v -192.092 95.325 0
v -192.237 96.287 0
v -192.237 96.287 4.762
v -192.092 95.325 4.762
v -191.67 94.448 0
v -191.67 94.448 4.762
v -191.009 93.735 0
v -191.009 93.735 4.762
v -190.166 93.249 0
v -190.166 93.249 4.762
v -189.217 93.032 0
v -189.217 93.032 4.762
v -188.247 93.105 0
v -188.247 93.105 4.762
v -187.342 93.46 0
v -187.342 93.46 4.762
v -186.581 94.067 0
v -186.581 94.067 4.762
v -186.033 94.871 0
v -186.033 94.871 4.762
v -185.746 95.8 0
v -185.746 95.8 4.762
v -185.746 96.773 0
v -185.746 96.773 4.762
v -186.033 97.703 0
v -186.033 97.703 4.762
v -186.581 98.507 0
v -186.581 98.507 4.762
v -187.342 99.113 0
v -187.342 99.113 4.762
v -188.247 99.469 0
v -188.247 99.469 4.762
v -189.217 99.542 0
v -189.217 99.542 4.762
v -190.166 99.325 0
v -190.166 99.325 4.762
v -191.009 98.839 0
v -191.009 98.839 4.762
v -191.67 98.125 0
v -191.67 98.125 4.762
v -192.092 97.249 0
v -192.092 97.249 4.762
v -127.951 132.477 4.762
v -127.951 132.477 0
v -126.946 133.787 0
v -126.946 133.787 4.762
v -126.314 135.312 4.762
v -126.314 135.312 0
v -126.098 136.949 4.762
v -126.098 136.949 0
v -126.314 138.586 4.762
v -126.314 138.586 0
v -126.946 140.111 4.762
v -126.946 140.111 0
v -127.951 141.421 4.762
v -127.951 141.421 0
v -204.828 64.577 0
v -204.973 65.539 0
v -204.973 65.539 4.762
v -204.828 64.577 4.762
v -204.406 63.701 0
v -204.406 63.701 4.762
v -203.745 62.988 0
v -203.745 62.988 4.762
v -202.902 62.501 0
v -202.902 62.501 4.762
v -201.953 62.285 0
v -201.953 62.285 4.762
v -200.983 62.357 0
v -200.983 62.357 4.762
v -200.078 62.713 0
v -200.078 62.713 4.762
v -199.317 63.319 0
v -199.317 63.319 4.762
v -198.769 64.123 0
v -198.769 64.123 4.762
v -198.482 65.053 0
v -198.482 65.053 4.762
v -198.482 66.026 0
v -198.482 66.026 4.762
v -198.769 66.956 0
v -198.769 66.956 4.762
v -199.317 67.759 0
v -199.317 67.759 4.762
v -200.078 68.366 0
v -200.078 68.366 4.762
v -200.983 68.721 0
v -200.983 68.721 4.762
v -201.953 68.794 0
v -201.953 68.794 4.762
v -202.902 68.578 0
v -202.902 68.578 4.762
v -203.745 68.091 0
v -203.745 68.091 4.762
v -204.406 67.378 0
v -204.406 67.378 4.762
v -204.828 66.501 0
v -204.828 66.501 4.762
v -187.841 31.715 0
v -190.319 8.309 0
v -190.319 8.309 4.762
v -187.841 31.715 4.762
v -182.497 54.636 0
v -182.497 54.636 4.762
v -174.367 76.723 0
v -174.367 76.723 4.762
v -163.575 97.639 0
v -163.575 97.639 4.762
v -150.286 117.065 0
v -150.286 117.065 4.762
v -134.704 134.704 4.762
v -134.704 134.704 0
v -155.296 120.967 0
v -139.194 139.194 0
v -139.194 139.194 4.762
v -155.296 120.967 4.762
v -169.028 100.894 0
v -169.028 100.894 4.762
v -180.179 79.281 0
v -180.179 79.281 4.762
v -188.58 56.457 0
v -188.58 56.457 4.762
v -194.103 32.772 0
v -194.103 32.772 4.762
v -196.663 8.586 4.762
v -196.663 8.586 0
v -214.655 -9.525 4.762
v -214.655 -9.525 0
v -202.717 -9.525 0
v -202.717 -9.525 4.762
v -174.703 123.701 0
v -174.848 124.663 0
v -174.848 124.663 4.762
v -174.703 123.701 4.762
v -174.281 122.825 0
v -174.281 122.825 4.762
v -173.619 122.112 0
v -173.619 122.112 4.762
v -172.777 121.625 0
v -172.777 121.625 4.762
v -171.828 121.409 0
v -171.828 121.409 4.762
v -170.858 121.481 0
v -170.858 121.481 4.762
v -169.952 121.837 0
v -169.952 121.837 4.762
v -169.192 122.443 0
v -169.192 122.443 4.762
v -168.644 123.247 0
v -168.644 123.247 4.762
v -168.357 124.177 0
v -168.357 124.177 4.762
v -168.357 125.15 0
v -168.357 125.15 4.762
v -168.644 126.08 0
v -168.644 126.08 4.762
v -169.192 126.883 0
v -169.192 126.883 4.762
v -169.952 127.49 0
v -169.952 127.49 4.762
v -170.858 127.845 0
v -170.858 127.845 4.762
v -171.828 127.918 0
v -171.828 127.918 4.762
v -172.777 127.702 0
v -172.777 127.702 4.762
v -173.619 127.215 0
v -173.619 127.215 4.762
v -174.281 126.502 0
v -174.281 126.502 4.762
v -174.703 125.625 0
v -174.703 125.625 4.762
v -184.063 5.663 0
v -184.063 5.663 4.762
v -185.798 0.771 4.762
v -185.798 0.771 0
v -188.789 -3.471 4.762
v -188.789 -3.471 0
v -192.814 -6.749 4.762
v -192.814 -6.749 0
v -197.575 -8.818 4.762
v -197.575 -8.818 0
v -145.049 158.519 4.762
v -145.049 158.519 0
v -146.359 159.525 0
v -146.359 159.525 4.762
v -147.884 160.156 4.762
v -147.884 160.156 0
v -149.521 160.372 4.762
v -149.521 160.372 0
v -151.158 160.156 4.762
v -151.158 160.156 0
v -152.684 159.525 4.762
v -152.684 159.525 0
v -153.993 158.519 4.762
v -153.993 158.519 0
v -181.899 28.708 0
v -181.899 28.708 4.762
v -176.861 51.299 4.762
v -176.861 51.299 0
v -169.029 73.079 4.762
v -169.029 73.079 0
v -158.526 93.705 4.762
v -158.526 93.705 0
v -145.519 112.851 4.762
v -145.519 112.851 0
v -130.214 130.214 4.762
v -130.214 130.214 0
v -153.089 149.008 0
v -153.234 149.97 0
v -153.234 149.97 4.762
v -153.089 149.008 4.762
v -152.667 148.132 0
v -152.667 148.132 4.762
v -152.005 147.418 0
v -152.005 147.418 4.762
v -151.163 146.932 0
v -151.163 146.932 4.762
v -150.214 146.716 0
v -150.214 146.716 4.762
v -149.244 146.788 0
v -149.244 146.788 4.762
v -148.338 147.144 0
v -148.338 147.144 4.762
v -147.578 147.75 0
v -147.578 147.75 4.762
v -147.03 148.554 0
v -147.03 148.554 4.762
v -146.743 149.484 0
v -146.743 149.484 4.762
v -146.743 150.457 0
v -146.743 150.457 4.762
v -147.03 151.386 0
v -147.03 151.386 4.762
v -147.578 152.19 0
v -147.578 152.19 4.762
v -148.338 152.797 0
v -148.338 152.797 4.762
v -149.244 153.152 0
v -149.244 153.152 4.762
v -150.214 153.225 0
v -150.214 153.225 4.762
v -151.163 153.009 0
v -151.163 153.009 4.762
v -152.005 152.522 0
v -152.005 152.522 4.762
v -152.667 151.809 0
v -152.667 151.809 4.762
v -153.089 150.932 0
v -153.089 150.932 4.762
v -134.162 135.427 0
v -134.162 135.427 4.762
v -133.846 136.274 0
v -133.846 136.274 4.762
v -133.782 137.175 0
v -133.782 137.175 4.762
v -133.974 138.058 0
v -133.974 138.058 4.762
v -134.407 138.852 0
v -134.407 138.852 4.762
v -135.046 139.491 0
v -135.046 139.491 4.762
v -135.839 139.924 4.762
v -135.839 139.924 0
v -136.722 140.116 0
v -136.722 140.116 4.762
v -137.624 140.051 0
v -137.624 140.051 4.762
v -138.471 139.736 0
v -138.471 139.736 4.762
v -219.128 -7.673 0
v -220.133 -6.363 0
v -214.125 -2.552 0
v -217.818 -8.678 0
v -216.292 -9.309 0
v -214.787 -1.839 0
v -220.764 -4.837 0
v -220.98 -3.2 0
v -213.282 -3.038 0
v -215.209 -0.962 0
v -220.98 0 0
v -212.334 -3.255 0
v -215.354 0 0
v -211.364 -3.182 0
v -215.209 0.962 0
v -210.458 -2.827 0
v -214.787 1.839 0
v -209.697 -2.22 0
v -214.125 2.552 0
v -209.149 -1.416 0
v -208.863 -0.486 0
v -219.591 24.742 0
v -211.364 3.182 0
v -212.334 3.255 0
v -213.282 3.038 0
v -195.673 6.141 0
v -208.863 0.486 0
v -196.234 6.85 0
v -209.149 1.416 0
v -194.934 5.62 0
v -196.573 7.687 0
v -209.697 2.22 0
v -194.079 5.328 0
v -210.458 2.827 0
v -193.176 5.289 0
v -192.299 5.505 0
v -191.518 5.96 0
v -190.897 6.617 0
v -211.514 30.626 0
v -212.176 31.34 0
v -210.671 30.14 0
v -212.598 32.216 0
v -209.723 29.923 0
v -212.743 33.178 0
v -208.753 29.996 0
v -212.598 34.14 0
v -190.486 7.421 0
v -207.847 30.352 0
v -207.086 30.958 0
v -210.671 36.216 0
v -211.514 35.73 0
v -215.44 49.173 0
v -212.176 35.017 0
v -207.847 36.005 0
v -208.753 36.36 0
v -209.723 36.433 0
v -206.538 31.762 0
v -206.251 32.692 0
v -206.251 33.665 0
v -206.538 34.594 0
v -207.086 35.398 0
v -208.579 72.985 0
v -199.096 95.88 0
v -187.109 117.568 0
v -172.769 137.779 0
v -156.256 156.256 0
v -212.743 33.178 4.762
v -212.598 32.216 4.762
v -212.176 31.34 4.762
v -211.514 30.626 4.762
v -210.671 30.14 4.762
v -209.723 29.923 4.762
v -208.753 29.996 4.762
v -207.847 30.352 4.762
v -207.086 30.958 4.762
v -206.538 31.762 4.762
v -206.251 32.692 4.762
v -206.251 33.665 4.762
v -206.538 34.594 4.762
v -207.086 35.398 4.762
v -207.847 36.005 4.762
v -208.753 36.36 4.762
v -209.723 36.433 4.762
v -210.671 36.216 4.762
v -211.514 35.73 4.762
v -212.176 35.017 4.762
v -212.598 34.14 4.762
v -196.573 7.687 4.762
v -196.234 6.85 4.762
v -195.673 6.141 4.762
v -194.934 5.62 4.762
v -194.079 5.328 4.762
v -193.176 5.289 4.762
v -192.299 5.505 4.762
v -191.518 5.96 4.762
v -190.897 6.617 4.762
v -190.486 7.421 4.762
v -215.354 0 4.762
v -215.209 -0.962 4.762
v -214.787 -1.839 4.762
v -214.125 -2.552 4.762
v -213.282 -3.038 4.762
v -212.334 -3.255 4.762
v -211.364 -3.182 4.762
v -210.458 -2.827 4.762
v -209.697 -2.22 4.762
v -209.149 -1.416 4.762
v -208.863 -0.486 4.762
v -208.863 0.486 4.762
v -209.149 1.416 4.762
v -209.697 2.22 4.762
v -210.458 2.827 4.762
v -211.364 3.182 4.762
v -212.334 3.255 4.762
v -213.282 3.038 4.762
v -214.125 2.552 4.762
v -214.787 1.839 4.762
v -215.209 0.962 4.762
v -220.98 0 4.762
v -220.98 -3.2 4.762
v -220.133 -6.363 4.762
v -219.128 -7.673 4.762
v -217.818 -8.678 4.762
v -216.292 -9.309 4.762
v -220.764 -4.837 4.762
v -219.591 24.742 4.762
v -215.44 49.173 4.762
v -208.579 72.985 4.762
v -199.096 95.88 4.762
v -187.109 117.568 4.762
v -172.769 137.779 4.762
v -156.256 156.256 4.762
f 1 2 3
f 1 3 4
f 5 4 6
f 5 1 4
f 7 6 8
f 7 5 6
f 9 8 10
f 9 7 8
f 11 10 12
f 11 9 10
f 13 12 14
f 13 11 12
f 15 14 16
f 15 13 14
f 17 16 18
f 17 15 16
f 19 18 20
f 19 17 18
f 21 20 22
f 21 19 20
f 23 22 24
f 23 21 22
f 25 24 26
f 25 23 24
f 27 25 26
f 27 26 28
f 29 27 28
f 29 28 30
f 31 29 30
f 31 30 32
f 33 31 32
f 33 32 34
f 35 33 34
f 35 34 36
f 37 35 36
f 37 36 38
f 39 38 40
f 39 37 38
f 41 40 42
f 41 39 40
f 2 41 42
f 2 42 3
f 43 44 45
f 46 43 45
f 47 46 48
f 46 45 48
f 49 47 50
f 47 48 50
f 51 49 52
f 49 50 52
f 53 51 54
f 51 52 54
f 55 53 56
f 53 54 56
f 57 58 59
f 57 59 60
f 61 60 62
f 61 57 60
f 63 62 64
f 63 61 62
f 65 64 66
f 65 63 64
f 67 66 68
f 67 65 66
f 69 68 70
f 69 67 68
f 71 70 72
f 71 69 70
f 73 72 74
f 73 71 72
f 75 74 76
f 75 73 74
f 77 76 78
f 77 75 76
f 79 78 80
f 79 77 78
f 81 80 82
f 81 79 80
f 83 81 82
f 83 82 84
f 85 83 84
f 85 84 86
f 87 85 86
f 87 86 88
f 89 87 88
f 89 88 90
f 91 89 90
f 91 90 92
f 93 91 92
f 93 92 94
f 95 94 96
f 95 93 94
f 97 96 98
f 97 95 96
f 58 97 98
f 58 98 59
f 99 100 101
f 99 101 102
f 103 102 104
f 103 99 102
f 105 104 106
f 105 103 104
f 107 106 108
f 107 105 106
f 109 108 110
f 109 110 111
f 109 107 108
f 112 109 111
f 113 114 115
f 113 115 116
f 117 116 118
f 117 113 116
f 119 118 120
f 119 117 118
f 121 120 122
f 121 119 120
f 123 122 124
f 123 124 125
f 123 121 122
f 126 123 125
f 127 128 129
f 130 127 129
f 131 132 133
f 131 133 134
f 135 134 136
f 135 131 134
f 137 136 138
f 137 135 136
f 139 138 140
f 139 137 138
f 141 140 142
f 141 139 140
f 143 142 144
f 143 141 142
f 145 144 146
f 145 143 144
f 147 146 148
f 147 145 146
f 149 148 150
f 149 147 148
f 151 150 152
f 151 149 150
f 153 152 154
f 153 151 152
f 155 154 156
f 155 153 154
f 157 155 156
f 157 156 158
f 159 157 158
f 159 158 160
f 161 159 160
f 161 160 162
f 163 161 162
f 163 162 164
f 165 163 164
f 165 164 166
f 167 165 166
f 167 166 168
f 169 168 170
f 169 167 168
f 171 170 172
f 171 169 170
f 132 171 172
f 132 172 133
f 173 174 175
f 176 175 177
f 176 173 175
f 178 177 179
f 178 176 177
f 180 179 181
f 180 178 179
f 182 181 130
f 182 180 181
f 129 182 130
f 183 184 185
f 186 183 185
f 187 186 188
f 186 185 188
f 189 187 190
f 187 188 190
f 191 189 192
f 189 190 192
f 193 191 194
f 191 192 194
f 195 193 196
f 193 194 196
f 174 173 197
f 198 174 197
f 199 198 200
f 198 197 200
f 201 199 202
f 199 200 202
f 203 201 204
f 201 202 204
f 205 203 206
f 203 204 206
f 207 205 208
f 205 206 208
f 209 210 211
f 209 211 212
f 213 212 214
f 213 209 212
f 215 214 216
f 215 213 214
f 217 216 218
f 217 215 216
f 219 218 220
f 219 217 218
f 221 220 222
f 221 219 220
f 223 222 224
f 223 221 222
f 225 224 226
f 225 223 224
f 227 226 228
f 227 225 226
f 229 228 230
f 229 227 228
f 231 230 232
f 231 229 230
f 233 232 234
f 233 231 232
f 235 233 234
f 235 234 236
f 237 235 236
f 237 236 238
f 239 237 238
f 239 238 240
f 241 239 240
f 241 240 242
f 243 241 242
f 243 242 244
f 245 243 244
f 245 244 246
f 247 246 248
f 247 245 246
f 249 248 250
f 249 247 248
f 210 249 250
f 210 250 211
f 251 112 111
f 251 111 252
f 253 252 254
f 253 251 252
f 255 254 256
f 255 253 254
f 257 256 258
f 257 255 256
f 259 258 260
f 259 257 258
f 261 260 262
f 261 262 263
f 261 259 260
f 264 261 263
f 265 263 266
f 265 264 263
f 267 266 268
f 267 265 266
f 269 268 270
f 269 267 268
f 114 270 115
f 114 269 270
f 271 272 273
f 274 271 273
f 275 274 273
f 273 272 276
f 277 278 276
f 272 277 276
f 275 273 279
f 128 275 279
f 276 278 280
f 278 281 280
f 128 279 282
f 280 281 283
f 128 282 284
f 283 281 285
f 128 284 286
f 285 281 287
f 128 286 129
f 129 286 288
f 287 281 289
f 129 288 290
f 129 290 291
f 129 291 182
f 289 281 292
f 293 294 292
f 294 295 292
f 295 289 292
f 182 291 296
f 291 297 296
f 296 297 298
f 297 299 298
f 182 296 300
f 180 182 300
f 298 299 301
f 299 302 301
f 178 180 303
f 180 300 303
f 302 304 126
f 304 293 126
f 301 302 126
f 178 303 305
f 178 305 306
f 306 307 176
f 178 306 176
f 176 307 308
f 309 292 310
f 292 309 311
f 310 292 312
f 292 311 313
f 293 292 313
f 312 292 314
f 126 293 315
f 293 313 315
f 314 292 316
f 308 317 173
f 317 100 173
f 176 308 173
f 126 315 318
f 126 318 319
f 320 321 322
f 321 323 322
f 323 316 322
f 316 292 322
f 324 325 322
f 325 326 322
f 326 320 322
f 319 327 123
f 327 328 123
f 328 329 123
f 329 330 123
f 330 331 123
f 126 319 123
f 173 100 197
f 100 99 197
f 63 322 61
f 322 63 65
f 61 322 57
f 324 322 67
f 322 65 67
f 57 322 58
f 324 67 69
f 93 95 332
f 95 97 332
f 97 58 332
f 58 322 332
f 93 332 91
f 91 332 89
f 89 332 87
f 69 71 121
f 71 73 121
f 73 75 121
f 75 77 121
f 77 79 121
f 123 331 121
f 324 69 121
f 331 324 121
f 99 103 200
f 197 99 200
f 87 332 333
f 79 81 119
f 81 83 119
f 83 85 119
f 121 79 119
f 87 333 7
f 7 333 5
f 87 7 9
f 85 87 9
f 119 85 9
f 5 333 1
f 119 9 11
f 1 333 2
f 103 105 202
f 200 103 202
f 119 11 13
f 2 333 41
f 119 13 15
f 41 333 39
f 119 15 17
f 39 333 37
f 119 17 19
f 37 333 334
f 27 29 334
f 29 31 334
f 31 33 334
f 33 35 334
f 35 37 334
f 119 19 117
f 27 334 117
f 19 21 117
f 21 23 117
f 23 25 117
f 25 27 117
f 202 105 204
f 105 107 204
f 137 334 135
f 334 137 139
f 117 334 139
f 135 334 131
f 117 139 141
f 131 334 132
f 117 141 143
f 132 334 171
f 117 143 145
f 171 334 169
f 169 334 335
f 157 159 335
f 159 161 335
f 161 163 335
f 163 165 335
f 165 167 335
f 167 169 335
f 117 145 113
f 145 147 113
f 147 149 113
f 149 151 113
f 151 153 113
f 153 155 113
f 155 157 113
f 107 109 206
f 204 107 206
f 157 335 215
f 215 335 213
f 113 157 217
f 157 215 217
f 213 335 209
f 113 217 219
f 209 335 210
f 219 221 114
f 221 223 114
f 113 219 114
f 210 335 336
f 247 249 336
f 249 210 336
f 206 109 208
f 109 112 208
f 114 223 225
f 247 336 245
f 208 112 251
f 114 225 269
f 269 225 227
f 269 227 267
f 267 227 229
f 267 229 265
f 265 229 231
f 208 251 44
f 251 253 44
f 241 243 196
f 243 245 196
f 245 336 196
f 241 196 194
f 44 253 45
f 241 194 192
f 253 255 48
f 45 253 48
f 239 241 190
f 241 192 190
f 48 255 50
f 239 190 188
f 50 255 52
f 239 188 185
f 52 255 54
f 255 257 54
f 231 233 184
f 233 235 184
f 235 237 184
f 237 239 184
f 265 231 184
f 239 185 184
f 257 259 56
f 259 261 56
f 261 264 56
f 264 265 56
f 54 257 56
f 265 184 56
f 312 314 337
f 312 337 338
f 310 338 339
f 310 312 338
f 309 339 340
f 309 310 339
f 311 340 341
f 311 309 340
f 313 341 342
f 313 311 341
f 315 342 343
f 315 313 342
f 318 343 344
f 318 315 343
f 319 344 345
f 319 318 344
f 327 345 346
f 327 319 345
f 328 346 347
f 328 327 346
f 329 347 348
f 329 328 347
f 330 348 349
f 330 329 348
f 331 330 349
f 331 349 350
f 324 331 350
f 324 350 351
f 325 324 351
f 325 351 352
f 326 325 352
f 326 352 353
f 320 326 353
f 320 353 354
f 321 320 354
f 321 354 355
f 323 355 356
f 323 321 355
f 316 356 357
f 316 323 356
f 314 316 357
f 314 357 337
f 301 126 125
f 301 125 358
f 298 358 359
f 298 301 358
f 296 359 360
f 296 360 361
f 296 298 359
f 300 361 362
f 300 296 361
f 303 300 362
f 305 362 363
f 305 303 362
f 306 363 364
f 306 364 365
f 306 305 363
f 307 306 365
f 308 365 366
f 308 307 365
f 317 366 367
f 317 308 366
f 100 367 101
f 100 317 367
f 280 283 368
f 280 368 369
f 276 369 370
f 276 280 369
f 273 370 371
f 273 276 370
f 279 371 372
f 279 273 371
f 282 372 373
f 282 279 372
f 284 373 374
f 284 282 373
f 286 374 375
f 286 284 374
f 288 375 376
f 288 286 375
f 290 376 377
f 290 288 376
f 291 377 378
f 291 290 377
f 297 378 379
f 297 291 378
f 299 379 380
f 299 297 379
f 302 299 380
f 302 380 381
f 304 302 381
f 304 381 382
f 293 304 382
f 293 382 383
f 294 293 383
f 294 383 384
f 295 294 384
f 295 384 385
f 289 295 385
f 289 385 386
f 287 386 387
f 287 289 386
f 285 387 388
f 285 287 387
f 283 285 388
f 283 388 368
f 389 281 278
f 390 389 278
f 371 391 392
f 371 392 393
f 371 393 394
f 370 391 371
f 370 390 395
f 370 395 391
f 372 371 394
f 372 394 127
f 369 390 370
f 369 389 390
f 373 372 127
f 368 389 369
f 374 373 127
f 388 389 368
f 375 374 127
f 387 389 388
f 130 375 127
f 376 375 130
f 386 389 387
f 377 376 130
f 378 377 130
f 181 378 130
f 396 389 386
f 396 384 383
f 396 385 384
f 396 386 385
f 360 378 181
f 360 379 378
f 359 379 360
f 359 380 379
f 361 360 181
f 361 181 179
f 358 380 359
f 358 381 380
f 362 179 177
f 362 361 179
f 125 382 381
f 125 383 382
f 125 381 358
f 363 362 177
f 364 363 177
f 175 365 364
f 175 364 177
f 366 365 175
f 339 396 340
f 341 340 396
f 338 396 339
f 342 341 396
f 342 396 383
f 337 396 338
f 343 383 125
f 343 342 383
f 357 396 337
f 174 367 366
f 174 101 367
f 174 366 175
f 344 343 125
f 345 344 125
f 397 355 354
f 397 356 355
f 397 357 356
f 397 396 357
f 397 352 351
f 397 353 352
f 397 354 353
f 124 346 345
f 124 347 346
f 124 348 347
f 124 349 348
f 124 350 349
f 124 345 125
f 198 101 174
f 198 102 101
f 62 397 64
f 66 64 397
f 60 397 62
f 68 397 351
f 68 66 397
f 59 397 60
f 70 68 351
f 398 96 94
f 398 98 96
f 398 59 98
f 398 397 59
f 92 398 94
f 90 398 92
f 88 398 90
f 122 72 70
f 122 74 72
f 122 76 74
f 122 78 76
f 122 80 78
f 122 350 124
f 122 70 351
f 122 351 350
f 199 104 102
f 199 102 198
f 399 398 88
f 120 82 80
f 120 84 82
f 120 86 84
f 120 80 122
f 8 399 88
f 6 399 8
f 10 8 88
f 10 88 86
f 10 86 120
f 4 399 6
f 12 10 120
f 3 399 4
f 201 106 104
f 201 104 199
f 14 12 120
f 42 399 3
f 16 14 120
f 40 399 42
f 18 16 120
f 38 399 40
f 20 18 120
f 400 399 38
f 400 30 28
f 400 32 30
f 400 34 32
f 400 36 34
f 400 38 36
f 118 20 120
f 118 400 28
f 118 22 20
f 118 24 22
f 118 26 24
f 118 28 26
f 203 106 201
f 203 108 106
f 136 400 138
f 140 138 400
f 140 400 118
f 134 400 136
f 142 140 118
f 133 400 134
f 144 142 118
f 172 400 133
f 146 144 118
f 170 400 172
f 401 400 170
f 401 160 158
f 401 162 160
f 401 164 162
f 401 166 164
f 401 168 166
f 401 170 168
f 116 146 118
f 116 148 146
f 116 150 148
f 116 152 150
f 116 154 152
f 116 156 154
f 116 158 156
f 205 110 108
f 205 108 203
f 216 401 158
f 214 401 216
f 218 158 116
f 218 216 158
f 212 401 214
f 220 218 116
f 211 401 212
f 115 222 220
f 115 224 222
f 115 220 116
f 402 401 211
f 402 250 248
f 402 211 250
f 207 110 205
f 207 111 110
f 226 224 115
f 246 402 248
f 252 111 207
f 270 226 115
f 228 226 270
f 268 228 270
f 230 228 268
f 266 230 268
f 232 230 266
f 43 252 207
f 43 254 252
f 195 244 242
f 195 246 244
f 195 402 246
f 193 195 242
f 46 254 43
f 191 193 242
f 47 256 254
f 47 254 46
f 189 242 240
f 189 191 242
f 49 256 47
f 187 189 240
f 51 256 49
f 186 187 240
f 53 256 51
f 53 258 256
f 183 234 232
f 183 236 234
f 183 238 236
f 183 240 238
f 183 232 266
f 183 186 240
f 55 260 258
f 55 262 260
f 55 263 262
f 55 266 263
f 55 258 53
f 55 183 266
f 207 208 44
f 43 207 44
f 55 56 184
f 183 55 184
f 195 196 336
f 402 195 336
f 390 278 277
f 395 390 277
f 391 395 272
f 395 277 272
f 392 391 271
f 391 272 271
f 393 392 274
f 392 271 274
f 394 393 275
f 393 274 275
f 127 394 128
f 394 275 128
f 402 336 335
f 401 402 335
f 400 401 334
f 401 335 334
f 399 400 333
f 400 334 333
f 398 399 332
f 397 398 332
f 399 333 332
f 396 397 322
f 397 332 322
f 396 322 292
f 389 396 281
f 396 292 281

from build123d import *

# Parameters (mm, degrees)
SKETCH1_R           = 3.2639
BOSS_EXTRUDE1_DEPTH = 4.7625
CUT_EXTRUDE4_DEPTH  = 274.082391315


with BuildPart() as part:
    # Sketch1 → Boss-Extrude1 (new body)
    with BuildSketch(Plane.XY):
        with BuildLine():
            Line((-220.98, 0), (-220.98, -3.2004))
            ThreePointArc((-220.98, -3.2004), (-219.127567548, -7.672567548), (-214.6554, -9.525))
            Line((-214.6554, -9.525), (-190.4746, -9.525))
            ThreePointArc((-190.4746, -9.525), (-186.002432452, -7.672567548), (-184.15, -3.2004))
            Line((-184.15, -3.2004), (-184.15, 0))
            ThreePointArc((-184.15, 0), (-170.132415912, 70.47115407), (-130.213713756, 130.213713756))
            Line((-130.213713756, 130.213713756), (-127.950689213, 132.476738298))
            ThreePointArc((-127.950689213, 132.476738298), (-126.098256761, 136.948905846), (-127.950689213, 141.421073395))
            Line((-127.950689213, 141.421073395), (-145.049096868, 158.519481049))
            ThreePointArc((-145.049096868, 158.519481049), (-149.521264416, 160.371913501), (-153.993431964, 158.519481049))
            Line((-153.993431964, 158.519481049), (-156.256456507, 156.256456507))
            ThreePointArc((-156.256456507, 156.256456507), (-204.158899094, 84.565384884), (-220.98, 0))
        make_face()
        with Locations(Location((-212.09, 0, 0), (0, 0, 180))):
            Circle(SKETCH1_R, mode=Mode.SUBTRACT)
        with Locations(Location((-209.478820157, 33.17818569, 0), (0, 0, 180))):
            Circle(SKETCH1_R, mode=Mode.SUBTRACT)
        with Locations(Location((-201.709576541, 65.539414337, 0), (0, 0, 180))):
            Circle(SKETCH1_R, mode=Mode.SUBTRACT)
        with Locations(Location((-188.973573715, 96.28684509, 0), (0, 0, 180))):
            Circle(SKETCH1_R, mode=Mode.SUBTRACT)
        with Locations(Location((-171.584414337, 124.663374159, 0), (0, 0, 180))):
            Circle(SKETCH1_R, mode=Mode.SUBTRACT)
        with Locations(Location((-149.970277222, 149.970277222, 0), (0, 0, 180))):
            Circle(SKETCH1_R, mode=Mode.SUBTRACT)
        with BuildLine():
            ThreePointArc((-190.318686211, 8.309493293), (-174.366836772, 76.723244418), (-134.703841816, 134.703841816))
            ThreePointArc((-134.703841816, 134.703841816), (-134.703841816, 139.193969877), (-139.193969877, 139.193969877))
            ThreePointArc((-139.193969877, 139.193969877), (-180.179064665, 79.280685899), (-196.662642418, 8.586476403))
            ThreePointArc((-196.662642418, 8.586476403), (-193.62915587, 5.276006744), (-190.318686211, 8.309493293))
        make_face(mode=Mode.SUBTRACT)
    extrude(amount=BOSS_EXTRUDE1_DEPTH)

    # Sketch2 → Cut-Extrude4 (cut, through all)
    with BuildSketch(Plane.XY):
        with BuildLine():
            Line((-202.7174, -9.525), (-183.6674, -9.525))
            Line((-183.6674, -9.525), (-183.6674, 9.525))
            ThreePointArc((-183.6674, 9.525), (-189.247015818, -3.945384182), (-202.7174, -9.525))
        make_face()
    extrude(amount=CUT_EXTRUDE4_DEPTH, mode=Mode.SUBTRACT)


solid = part.part
